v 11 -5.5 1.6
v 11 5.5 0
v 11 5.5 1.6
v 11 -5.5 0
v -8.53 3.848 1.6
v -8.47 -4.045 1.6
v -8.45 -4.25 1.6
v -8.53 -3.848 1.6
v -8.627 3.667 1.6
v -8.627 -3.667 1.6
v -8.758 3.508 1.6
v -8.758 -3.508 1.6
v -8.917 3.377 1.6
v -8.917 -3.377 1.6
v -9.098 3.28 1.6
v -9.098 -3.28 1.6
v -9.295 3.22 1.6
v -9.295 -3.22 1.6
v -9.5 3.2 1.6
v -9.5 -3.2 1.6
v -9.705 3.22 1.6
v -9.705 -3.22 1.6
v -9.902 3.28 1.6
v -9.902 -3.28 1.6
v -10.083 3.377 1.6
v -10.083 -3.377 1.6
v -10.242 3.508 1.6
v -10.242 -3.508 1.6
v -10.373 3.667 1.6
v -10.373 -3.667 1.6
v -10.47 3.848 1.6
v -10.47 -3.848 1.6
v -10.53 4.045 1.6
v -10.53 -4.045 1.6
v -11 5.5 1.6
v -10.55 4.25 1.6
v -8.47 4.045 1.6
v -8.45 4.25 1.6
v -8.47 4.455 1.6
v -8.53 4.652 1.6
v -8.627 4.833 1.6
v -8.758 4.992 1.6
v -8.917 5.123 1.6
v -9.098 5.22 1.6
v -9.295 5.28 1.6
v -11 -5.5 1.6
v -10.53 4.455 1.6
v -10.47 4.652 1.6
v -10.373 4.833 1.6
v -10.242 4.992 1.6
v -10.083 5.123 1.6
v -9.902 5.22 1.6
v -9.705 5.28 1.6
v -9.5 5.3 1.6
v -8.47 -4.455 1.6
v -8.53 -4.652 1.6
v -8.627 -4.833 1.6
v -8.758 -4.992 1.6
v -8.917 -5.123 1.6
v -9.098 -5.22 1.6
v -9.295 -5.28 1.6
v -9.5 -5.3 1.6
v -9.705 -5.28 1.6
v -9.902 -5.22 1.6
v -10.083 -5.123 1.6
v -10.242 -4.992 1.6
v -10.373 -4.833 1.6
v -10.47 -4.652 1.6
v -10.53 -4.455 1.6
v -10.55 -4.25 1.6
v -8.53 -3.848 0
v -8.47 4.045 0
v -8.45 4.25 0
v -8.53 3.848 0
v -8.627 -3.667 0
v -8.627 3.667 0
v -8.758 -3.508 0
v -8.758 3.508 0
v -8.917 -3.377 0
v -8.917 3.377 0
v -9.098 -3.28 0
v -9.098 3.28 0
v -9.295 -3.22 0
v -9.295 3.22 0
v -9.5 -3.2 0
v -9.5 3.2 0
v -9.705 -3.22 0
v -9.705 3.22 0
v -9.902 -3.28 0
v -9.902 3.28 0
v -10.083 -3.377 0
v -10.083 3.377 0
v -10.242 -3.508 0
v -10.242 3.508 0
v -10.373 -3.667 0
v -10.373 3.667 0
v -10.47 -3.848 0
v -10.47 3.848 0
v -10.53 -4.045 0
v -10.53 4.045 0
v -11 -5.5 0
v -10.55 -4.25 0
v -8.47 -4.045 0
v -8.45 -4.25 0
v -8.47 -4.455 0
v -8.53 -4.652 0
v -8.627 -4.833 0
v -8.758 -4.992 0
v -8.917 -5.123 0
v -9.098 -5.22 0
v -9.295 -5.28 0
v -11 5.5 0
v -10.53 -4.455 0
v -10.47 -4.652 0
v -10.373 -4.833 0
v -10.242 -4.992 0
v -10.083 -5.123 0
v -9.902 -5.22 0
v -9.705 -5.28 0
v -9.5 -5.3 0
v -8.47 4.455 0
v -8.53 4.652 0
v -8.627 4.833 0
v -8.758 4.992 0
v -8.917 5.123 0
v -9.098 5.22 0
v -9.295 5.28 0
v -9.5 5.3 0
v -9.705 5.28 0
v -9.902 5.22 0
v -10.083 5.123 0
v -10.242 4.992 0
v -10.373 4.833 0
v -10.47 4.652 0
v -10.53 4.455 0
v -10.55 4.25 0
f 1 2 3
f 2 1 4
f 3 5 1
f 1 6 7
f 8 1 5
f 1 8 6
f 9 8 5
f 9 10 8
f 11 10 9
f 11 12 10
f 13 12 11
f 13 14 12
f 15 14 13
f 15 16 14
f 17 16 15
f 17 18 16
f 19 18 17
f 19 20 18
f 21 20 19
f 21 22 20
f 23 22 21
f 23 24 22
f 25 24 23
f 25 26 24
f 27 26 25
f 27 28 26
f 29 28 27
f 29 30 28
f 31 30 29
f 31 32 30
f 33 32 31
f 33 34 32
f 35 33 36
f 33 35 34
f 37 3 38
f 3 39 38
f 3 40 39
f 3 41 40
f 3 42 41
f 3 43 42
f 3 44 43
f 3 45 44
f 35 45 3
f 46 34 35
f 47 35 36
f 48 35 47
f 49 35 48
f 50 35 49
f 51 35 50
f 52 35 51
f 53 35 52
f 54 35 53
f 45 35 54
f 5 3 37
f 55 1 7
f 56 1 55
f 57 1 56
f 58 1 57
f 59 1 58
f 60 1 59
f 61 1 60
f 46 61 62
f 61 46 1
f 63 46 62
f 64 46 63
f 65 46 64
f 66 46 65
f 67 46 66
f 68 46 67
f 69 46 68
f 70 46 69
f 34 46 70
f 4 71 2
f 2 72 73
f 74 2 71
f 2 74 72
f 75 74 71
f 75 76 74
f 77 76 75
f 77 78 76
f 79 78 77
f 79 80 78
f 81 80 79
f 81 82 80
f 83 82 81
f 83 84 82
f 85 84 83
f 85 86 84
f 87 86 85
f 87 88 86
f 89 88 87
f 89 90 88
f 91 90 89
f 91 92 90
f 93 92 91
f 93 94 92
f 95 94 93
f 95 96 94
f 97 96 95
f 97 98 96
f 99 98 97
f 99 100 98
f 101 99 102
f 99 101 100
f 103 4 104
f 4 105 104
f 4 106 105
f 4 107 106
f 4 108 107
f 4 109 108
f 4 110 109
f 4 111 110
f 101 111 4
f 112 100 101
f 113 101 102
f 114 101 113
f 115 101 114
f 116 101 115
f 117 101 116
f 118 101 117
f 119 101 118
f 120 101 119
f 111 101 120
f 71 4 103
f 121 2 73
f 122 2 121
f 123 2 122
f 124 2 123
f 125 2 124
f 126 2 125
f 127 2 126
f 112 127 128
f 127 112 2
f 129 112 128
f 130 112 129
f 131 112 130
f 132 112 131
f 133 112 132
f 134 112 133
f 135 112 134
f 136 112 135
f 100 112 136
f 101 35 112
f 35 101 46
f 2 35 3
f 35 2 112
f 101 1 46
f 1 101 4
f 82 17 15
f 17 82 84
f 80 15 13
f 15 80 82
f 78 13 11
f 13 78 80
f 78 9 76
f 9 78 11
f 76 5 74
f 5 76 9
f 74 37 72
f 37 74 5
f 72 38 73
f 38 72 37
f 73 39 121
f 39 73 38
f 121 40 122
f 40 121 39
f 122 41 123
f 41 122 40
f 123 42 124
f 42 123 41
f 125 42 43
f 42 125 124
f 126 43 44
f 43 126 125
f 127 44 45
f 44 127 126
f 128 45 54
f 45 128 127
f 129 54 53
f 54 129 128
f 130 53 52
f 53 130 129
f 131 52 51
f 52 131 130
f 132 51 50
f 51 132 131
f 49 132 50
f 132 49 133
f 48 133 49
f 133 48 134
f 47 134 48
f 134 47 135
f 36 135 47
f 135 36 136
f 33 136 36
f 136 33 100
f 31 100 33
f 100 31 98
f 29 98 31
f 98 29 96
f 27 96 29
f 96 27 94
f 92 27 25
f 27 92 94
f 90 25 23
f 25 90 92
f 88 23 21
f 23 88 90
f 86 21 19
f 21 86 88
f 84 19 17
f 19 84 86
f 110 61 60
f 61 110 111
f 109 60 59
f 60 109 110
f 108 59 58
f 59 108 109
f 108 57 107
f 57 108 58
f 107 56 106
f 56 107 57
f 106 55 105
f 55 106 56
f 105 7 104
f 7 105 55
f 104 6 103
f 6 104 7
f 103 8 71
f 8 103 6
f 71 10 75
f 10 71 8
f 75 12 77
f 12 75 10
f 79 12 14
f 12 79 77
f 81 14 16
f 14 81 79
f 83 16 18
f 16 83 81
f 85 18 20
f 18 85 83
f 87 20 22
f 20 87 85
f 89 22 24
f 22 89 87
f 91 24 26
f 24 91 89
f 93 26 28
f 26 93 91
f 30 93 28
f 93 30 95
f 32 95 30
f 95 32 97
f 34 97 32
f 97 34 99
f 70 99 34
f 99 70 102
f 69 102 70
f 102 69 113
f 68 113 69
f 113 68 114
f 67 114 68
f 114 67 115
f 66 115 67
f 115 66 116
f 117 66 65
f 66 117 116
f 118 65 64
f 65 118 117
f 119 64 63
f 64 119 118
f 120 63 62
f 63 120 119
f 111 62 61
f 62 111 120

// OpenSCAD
pcb_dimensions = [22, 11, 1.6];

mounting_hole_diameter = 2.1;
mounting_hole_centres = 8.5;

module CanBoardHoles()
{
  for(y = [-mounting_hole_centres / 2, mounting_hole_centres / 2])
  {
    translate([-9.5, y, 0])
    {
      circle(d=mounting_hole_diameter, $fn=32);
    }
  }
}

module CanBoard()
{
  difference()
  {
    /* PCB */
    translate([0, 0, pcb_dimensions[2] / 2])
    {
      color("green")
      {
        cube(pcb_dimensions, center=true);
      }
    }

    linear_extrude(20, center=true)
    {
      CanBoardHoles();
    }
  }
}

CanBoard();
